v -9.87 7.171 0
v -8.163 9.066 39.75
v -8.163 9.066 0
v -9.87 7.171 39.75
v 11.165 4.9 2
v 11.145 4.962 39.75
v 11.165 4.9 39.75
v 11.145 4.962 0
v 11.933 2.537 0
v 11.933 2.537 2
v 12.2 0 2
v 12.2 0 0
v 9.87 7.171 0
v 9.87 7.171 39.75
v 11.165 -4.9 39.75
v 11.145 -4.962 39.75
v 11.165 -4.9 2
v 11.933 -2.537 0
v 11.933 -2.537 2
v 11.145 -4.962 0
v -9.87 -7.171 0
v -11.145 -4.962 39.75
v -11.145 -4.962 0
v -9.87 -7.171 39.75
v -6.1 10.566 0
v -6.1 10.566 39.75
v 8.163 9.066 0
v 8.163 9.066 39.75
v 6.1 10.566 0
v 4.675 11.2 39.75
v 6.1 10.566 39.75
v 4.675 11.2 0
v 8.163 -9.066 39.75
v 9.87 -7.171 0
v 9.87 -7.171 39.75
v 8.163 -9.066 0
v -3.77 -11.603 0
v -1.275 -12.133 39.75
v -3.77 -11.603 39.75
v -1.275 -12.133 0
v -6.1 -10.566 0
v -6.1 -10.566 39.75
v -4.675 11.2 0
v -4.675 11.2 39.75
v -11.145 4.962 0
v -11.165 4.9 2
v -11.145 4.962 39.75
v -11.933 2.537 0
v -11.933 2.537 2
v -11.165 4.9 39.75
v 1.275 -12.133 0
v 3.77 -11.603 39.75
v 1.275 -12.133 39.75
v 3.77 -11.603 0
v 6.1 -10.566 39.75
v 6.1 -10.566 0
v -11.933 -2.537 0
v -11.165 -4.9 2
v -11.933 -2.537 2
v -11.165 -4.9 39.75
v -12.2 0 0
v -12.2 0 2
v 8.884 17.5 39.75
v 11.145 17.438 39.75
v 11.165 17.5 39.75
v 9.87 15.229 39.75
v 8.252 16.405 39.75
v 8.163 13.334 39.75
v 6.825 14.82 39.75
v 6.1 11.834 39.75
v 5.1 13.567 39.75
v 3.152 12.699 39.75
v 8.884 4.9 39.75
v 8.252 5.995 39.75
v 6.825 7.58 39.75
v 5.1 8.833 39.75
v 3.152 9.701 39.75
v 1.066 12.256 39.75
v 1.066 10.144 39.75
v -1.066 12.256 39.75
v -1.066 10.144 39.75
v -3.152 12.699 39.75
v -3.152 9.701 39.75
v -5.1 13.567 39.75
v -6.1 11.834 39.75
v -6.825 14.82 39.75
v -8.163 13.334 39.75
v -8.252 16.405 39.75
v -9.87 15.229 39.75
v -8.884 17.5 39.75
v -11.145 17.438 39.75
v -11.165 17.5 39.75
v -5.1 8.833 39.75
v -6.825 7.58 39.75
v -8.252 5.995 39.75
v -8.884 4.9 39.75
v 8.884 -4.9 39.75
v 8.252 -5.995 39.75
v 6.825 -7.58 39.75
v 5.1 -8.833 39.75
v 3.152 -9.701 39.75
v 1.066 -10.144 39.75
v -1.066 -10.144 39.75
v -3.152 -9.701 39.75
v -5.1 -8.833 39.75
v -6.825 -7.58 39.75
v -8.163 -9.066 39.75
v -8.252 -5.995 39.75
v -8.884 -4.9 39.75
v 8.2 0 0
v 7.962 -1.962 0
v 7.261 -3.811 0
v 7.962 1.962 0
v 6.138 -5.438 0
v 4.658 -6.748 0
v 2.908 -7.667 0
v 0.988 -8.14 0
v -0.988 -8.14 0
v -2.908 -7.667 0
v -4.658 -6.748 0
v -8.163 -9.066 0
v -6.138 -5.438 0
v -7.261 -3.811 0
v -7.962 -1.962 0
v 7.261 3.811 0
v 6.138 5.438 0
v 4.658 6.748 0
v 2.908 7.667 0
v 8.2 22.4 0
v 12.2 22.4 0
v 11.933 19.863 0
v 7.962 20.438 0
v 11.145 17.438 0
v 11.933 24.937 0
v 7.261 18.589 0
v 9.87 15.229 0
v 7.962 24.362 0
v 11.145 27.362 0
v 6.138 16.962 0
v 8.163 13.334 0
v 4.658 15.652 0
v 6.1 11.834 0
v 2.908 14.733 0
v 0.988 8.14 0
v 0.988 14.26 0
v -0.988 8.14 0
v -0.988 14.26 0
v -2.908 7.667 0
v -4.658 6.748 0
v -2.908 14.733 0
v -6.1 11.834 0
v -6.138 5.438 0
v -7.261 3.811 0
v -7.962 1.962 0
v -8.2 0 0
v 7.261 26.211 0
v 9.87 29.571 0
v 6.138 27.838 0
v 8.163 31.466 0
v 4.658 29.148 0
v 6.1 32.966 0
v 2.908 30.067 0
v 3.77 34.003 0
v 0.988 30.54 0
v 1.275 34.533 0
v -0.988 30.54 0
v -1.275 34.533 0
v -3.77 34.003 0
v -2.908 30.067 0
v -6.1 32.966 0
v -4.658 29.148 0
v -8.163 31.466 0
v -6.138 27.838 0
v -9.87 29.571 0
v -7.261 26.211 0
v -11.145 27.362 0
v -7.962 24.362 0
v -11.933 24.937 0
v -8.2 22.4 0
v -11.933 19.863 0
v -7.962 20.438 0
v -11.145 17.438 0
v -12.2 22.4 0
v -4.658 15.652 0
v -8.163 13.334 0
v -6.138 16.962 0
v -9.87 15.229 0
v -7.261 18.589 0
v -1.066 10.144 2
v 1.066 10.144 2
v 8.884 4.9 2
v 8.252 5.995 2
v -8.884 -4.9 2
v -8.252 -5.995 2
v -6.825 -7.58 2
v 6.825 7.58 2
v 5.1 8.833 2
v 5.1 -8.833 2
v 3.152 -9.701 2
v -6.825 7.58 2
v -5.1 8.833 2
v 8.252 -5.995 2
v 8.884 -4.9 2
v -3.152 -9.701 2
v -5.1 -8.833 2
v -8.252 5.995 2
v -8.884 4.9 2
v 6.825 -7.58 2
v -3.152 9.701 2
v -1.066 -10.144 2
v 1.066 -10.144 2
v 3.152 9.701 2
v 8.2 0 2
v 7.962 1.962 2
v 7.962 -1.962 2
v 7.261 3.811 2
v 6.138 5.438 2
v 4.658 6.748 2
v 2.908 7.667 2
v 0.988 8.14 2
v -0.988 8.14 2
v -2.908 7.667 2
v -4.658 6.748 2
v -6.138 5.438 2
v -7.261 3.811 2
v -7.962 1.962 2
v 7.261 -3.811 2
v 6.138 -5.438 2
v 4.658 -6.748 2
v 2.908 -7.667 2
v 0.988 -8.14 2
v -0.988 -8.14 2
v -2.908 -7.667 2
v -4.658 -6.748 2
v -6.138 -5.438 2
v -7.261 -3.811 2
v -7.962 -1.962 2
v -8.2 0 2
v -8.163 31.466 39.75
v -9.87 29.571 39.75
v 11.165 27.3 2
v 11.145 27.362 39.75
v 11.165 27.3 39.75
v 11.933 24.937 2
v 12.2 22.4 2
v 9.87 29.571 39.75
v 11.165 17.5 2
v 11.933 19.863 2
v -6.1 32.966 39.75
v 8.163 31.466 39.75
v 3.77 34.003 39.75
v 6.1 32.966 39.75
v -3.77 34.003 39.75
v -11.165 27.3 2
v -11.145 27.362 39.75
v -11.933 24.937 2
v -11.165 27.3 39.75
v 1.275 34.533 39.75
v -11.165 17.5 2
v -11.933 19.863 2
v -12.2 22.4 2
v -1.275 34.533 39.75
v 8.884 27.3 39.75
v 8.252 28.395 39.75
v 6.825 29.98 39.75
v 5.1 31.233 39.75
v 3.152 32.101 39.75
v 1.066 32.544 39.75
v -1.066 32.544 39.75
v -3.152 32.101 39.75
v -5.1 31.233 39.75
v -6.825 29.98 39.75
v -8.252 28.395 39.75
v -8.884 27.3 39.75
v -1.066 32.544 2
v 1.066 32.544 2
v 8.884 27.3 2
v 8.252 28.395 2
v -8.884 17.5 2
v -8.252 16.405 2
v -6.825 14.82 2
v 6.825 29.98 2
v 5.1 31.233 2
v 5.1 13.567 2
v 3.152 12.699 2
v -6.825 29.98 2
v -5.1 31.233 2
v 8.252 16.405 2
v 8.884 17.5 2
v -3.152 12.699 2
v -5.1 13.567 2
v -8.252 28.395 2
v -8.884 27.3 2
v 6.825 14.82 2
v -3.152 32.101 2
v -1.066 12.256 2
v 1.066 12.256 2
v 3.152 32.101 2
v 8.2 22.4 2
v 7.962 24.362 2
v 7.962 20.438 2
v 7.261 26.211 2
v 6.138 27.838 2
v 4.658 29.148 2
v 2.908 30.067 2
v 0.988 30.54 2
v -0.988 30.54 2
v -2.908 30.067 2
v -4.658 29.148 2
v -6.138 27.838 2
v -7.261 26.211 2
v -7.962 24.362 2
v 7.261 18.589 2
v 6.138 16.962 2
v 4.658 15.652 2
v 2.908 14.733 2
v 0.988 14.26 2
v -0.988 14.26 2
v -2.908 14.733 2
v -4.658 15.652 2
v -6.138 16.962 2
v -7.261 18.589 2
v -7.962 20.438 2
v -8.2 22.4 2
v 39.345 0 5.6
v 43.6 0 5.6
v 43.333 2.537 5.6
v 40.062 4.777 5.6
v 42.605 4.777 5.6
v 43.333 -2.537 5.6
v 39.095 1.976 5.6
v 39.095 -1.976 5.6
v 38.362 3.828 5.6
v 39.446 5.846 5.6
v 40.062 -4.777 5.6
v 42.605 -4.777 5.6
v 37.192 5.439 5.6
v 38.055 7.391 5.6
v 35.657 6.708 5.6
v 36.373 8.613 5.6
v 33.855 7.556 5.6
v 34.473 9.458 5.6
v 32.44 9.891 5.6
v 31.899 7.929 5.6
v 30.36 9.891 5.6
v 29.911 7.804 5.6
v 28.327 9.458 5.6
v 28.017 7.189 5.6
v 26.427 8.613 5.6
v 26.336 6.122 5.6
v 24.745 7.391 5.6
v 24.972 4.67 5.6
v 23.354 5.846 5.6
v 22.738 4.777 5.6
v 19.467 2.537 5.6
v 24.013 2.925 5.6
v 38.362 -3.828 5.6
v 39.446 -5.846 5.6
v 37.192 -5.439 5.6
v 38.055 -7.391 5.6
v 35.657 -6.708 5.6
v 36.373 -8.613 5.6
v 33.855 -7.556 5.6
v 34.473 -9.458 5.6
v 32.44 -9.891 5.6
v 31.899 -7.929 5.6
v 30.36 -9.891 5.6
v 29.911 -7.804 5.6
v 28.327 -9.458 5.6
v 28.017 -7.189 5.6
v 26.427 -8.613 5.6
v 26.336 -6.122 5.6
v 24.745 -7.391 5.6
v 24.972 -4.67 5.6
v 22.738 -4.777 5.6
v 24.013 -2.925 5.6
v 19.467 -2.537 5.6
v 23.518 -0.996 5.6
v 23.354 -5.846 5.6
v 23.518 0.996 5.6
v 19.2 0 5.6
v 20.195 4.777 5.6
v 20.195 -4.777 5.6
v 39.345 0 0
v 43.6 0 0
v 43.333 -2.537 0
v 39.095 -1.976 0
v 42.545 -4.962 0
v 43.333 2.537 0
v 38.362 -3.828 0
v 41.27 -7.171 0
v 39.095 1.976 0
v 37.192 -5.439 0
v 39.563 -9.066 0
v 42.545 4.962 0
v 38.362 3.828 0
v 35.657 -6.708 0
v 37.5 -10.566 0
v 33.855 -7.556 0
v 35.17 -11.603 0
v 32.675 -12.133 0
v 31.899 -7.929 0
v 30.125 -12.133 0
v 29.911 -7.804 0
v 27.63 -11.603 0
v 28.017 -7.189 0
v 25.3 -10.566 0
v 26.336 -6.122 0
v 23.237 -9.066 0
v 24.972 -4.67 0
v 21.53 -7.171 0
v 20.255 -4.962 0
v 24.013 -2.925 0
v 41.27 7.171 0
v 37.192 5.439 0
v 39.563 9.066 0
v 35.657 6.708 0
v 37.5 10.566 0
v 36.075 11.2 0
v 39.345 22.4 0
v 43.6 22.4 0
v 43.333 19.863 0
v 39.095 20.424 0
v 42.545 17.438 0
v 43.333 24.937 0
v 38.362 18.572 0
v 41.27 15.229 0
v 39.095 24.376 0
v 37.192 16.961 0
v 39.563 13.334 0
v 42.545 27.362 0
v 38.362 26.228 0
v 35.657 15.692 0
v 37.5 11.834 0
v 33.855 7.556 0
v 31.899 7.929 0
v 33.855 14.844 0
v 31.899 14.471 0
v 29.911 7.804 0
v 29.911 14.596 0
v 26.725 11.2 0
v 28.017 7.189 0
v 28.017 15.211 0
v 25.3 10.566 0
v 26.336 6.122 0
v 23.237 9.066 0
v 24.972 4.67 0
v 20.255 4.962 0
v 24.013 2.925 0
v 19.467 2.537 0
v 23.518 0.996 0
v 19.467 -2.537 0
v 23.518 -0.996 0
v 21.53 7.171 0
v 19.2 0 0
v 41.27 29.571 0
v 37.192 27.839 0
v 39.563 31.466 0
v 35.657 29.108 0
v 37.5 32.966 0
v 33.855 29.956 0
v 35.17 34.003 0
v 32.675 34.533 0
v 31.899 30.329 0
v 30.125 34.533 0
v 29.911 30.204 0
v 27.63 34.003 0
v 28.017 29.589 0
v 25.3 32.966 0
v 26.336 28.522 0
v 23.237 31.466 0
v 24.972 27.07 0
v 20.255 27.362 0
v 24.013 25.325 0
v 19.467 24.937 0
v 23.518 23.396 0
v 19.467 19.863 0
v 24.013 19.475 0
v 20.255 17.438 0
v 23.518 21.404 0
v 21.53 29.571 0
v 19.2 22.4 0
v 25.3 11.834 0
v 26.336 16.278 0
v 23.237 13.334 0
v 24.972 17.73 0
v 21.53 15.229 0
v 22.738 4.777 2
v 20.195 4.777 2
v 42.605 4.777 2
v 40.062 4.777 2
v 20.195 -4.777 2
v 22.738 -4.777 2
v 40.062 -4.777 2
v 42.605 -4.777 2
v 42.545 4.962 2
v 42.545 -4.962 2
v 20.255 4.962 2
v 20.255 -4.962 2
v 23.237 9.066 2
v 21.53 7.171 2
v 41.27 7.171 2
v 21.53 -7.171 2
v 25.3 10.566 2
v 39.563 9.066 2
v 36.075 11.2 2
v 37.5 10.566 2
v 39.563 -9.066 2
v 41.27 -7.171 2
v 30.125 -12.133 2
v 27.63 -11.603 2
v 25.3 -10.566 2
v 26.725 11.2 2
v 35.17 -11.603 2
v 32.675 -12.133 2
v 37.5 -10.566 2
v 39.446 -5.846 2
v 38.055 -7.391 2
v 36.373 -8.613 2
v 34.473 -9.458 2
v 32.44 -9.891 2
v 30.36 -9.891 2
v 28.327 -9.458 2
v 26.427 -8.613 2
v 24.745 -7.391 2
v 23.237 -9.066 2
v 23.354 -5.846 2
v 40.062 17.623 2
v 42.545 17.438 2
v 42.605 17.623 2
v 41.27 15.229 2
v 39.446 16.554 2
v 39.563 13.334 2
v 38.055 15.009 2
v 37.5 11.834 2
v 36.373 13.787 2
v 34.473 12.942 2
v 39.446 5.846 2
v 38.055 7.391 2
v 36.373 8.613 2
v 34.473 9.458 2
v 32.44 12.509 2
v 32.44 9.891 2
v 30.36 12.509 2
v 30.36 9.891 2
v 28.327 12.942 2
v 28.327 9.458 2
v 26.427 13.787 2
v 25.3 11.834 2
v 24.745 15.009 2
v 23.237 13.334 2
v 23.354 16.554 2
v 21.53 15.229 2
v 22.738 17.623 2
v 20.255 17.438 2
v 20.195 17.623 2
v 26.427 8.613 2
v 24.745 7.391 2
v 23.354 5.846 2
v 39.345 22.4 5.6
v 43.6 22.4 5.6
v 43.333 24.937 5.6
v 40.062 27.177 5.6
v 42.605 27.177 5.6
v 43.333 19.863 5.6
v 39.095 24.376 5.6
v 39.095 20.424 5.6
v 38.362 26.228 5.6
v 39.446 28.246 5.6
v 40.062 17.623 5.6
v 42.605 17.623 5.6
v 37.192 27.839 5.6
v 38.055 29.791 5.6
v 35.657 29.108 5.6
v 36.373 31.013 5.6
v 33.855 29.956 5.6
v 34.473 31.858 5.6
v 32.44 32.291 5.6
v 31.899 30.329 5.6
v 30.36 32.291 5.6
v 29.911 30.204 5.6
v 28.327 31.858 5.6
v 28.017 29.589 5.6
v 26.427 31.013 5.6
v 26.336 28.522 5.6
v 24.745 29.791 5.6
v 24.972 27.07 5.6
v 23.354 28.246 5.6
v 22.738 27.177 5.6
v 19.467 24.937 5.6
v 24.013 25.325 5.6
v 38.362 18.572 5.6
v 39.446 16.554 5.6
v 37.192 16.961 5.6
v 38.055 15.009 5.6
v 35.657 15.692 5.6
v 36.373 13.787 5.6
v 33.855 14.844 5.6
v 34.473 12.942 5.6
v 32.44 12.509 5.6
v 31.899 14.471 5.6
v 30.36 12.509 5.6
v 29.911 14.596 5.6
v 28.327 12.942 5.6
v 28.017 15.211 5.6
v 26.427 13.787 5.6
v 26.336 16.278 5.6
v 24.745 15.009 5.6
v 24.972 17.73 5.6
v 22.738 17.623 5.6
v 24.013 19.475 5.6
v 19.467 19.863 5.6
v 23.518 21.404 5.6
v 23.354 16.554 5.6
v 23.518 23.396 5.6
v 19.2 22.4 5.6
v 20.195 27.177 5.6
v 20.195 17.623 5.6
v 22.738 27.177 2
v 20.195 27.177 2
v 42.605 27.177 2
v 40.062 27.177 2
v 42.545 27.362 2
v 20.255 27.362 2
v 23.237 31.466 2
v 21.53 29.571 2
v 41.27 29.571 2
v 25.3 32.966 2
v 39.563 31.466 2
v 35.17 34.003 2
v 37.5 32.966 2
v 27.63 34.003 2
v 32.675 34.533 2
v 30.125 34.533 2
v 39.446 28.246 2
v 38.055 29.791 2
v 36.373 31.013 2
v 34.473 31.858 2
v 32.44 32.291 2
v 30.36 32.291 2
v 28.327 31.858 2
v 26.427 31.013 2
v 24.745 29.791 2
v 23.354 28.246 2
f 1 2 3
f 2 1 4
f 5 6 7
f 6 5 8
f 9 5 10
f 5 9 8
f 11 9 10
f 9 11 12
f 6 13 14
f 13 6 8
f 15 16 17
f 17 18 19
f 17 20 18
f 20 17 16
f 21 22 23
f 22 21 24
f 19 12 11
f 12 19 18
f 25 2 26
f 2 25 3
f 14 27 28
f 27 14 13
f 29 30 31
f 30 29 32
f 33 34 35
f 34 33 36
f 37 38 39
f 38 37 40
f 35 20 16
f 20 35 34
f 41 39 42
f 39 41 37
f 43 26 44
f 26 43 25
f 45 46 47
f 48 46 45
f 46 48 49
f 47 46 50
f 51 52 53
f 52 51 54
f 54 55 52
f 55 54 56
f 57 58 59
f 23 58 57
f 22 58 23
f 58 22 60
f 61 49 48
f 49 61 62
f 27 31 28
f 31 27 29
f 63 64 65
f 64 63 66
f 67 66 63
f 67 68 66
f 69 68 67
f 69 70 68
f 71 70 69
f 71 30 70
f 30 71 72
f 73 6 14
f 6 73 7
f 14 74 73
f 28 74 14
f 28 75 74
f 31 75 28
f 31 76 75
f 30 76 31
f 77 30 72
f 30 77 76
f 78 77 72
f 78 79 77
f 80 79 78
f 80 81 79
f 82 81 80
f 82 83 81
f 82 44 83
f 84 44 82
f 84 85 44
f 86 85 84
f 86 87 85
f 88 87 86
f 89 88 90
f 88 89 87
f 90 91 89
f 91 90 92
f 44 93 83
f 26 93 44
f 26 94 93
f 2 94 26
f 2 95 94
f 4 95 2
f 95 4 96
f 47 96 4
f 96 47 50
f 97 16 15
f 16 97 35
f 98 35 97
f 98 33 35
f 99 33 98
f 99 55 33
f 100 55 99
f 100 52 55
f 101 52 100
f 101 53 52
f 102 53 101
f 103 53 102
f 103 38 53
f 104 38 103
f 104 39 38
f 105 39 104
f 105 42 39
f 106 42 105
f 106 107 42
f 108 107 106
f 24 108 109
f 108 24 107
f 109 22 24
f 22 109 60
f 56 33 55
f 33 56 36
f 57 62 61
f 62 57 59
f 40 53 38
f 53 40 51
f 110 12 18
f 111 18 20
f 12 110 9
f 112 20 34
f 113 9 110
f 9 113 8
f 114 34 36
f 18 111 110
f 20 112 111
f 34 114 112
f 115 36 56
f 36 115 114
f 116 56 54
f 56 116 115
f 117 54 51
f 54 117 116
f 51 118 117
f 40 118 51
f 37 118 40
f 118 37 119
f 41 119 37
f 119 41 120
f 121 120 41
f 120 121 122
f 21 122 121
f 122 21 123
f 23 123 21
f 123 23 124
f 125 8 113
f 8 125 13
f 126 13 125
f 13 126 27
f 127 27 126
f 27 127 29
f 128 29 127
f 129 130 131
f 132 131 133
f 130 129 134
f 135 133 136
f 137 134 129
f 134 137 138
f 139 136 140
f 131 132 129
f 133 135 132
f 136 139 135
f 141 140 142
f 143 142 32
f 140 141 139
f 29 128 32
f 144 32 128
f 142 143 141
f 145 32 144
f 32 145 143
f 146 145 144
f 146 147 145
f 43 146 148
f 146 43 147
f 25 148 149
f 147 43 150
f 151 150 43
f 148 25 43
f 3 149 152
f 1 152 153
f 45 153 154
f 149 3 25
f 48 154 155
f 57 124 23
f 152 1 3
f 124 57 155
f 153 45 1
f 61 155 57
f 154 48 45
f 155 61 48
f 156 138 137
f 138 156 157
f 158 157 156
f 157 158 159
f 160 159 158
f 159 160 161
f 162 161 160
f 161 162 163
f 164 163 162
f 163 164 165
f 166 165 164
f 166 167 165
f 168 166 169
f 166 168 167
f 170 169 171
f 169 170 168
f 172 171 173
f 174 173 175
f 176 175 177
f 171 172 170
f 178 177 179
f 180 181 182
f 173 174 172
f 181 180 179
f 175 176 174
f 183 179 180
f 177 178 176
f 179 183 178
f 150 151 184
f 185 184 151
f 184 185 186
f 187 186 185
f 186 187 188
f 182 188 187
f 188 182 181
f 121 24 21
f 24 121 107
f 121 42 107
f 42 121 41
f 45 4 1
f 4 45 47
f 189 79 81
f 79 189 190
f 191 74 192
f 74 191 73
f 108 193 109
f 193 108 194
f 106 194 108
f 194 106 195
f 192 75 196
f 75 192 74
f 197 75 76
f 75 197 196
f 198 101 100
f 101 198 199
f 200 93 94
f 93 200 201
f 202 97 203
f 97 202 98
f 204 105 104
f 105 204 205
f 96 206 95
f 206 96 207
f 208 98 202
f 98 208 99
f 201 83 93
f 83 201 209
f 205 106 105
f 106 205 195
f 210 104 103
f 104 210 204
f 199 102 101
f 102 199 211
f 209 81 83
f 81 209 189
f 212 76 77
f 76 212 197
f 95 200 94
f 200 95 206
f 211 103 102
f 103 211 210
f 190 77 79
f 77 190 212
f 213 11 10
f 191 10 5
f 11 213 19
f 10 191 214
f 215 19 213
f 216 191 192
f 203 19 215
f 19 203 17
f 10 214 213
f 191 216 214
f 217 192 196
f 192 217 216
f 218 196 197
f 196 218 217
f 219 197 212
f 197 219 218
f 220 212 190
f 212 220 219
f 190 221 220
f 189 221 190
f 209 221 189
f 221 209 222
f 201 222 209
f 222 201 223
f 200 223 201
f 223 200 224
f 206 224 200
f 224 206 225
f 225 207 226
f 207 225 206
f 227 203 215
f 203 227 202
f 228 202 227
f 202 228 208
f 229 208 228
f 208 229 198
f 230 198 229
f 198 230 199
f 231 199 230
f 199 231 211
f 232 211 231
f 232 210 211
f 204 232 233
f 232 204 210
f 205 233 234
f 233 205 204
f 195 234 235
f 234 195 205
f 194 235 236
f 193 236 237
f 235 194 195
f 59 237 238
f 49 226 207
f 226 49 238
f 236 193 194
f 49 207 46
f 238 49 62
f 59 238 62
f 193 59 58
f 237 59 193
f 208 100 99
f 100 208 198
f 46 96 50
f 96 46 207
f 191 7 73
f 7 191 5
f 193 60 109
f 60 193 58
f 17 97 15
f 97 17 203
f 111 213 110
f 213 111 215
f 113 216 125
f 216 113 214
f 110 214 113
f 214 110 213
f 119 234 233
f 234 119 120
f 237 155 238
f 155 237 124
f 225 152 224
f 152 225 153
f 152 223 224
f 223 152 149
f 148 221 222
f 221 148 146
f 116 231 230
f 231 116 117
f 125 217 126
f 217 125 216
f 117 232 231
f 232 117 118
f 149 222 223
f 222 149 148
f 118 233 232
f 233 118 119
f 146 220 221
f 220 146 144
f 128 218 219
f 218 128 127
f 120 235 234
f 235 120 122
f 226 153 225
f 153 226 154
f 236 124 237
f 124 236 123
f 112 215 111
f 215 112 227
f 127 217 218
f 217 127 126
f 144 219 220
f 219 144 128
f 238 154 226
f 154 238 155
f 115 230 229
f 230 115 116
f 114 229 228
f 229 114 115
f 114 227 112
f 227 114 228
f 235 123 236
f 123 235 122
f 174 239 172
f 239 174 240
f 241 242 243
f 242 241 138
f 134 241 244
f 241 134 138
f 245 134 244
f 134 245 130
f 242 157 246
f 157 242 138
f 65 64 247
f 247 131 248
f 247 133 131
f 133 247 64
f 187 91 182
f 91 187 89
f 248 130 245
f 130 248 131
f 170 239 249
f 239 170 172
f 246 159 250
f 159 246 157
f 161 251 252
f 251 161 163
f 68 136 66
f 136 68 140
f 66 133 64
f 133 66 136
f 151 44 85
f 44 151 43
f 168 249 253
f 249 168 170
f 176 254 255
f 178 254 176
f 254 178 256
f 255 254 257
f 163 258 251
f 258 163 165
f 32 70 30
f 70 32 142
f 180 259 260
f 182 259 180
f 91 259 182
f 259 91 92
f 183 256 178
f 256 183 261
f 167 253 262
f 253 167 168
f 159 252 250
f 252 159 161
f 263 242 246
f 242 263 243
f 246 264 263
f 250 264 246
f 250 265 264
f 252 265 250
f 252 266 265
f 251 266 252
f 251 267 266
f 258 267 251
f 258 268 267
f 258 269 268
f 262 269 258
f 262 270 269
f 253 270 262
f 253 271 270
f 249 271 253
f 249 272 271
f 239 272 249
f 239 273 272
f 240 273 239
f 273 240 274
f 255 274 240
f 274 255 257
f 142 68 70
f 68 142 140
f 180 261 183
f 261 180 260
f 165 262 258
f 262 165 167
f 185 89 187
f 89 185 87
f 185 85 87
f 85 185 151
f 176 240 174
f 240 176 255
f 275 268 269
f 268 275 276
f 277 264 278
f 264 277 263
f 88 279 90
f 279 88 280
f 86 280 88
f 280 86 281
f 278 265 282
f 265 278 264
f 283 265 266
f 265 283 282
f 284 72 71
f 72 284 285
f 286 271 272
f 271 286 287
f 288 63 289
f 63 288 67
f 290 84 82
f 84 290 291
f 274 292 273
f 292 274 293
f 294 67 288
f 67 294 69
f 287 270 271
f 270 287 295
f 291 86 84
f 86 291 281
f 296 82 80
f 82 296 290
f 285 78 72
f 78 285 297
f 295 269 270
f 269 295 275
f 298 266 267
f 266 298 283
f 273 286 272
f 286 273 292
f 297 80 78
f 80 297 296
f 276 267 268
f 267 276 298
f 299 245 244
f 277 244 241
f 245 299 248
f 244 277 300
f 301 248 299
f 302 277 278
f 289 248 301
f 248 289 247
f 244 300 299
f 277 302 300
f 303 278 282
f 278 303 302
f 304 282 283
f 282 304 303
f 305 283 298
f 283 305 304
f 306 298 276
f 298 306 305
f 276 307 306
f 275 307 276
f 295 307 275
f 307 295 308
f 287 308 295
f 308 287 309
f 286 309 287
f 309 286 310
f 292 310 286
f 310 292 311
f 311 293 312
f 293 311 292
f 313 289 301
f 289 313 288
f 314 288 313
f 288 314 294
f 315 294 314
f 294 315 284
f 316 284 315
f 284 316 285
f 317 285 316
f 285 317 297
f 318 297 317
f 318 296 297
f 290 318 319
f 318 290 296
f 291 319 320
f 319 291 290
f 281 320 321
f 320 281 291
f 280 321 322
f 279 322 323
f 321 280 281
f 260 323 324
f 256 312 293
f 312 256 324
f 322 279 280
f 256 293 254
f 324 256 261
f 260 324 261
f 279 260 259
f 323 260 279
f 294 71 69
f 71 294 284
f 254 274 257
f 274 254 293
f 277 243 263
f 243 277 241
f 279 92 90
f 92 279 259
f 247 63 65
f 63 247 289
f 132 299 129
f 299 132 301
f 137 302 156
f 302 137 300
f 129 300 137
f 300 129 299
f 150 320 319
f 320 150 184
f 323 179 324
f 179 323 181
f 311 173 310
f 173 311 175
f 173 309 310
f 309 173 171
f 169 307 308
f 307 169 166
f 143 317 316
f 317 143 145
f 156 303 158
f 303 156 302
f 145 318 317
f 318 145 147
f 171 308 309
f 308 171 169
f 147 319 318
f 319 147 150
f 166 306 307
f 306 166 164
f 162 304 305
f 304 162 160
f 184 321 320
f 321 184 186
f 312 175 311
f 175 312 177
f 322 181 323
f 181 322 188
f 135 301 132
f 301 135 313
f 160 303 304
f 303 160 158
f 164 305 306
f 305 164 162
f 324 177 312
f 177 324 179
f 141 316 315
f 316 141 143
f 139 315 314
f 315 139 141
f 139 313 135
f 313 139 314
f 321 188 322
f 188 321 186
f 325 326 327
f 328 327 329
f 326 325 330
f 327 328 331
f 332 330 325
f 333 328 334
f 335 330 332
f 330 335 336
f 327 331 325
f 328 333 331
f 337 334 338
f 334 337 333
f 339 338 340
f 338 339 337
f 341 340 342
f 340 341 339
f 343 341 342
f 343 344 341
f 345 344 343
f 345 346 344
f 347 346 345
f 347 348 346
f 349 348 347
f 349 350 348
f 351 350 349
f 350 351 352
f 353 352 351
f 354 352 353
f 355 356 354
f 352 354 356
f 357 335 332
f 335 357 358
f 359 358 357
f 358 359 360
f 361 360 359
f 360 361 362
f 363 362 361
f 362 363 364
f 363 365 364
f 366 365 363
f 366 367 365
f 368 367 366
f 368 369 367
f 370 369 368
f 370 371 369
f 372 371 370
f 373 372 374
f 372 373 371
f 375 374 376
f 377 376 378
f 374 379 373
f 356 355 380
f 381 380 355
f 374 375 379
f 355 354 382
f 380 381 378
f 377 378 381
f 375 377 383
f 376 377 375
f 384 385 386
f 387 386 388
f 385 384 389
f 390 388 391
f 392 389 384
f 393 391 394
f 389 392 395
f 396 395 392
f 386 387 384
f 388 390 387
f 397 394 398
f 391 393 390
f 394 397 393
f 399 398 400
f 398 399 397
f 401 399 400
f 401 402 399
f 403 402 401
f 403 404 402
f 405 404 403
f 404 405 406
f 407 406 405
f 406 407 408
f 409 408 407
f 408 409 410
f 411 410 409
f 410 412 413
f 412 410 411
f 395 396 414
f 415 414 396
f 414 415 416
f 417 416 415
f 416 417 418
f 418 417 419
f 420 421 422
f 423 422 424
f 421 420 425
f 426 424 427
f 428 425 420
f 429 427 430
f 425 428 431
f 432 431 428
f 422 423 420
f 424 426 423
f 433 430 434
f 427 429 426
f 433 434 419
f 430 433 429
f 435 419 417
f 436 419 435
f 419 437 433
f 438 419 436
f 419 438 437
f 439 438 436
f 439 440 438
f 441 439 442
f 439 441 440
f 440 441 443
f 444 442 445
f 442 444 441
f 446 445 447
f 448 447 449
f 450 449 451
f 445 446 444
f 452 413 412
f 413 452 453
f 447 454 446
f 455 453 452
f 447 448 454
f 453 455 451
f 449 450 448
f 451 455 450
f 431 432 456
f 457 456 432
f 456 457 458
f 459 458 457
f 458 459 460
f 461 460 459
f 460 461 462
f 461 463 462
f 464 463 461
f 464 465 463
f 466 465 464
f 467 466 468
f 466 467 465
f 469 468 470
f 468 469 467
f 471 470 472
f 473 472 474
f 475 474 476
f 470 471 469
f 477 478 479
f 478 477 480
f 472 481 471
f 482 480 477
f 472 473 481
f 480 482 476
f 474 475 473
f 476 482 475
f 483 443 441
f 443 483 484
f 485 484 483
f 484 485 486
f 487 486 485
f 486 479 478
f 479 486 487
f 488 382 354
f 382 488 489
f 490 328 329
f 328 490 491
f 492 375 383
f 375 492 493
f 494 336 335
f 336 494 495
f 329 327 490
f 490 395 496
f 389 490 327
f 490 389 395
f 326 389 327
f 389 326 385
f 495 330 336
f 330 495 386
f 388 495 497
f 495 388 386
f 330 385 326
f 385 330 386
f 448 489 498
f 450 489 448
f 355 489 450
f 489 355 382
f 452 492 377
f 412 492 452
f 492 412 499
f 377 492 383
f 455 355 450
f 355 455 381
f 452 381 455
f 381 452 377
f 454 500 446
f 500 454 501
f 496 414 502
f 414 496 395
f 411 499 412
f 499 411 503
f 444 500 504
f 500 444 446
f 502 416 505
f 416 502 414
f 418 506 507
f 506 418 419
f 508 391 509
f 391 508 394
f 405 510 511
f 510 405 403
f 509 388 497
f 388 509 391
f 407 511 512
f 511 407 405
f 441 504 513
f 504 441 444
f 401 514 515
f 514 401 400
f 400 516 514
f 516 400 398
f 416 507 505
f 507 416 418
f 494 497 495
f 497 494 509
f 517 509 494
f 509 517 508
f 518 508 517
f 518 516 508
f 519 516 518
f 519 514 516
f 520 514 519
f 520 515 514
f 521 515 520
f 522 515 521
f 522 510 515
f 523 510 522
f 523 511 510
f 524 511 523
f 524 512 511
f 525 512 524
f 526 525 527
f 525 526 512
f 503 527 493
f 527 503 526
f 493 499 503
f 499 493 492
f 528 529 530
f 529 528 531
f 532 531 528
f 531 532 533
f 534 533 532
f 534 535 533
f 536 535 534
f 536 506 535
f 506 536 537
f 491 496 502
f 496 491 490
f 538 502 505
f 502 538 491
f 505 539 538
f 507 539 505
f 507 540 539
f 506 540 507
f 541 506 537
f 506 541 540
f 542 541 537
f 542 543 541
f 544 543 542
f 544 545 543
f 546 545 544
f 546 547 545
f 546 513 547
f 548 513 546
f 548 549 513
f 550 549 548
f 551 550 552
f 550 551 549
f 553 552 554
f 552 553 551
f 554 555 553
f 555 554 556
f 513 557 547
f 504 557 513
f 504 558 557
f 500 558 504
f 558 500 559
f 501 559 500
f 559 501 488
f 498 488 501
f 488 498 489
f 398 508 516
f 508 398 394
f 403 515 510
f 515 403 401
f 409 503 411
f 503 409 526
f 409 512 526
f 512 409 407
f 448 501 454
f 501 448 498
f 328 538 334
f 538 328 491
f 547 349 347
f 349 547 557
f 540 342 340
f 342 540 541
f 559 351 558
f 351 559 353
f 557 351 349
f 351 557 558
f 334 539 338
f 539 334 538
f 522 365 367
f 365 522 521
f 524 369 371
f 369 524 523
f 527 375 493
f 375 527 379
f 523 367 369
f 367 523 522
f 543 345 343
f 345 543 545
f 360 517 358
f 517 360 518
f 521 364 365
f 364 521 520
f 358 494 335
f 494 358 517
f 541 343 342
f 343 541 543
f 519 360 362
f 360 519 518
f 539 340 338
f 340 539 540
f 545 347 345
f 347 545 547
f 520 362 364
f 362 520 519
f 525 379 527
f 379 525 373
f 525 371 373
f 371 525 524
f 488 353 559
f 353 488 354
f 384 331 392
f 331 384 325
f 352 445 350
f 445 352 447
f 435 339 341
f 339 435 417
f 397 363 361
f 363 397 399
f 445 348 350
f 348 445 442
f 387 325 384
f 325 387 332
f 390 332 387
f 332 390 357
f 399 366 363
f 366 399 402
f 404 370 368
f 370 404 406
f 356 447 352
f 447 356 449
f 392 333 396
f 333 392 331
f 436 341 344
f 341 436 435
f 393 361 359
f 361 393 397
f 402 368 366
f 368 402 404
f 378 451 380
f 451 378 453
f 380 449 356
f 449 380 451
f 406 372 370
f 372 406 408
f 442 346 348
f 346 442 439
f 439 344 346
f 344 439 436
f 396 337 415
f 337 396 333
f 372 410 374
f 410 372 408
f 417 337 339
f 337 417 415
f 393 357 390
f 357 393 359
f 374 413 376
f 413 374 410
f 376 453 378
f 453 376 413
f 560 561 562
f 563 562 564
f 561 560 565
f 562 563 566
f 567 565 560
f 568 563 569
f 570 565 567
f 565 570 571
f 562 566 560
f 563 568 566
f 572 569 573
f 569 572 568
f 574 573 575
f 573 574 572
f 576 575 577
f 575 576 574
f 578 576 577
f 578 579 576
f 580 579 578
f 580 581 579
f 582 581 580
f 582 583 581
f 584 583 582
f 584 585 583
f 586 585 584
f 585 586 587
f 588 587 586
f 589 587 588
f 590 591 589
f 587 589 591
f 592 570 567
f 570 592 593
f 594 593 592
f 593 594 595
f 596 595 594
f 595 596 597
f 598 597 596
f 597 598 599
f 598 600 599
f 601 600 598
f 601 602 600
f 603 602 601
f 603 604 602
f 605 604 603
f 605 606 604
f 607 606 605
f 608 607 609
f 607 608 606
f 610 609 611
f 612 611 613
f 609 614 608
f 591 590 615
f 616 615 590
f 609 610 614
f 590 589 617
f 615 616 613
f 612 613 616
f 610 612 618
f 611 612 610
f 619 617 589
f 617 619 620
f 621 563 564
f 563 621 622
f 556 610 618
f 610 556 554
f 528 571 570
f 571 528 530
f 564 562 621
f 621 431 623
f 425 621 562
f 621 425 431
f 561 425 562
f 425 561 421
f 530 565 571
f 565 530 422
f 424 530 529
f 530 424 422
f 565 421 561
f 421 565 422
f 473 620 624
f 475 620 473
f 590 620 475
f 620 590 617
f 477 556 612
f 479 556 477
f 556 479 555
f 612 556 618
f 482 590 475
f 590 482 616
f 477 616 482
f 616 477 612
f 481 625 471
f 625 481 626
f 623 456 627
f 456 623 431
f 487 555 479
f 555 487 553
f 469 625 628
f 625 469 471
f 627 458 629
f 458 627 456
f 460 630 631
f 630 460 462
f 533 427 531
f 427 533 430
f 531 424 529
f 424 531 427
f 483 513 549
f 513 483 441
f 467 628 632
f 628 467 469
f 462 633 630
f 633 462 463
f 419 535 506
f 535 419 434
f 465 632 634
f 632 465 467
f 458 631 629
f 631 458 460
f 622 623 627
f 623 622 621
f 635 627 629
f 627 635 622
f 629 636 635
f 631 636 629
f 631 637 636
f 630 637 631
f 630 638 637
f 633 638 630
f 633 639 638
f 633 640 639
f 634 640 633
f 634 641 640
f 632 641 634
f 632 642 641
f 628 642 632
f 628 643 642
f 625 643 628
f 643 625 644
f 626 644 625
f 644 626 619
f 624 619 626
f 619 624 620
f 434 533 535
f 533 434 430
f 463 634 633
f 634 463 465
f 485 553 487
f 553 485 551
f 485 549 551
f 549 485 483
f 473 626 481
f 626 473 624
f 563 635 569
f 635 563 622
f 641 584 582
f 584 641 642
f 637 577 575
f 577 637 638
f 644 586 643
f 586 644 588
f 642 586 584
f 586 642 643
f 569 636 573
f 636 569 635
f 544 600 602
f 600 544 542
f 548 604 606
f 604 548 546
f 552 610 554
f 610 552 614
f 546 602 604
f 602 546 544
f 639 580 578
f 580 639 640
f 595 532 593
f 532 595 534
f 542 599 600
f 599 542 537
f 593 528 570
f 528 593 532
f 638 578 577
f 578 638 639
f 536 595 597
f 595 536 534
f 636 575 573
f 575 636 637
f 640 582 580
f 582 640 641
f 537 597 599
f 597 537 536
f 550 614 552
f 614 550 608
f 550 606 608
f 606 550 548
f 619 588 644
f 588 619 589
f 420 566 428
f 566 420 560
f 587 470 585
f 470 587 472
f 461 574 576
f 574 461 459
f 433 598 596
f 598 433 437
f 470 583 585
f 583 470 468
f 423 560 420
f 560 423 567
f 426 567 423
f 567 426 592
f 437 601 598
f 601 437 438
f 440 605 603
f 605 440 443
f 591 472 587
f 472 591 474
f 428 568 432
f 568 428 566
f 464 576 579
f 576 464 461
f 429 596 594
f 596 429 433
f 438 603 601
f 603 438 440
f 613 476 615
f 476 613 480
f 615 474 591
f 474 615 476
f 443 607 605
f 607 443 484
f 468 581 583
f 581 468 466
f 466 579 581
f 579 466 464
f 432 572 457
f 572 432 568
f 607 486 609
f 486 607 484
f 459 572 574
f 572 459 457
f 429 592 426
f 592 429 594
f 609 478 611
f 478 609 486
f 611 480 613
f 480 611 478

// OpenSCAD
/*
 * PARAMETRIC COIN TUBES + CAP
 * VERSION 1.3.1
 * last update: 02/12/13
 * design by newq 
 * mod kitwallace (thanks!)
 */

// 
// the generated tubes insides are 2 coins higher than the number of coins they fit

coin_type = 0; // [ 0:10 KZT, 1:20 KZT, 2:50 KZT,  3:100 KZT, 4:5 KZT, 5:1 KZT, 6:2 Euro cent, 7: 1 Euro cent, 8: 1 US Dollar, 9: 0.50 US Dollar, 10: 0.25 US Dollar, 11: 0.10 US Dollar, 12: 0.05 US Dollar, 13: 0.01 US Dollar, 14: 2 Canadian Dollar, 15: 1 Canadian Dollar, 16: 0.50 Canadian Dollar, 17: 0.25 Canadian Dollar, 18: 0.10 Canadian Dollar, 19: 0.05 Canadian Dollar, 20: 0.01 Canadian Dollar]

// how many stacked coins should fit in a tube
number_of_coins = 25; 
number_of_tubes = 2; 

// Do you want to print the tubes?
generate_tube = 1; // [1:Yes, 0:No] 
// Do you want a cap to close the tube?
generate_cap = 1; // [1:Yes, 0:No] 
// thickness of wall and bottom (mm)
tube_wall = 2;  
// clearance from coin to wall of tube (mm) 
clearance = 0.4;
// if the cap fits too tight you might decrease slightly
fudge_factor = 0.975; 

// NOTHING TO SEE HERE :)

// coin data - name, diameter, height
coins = [ 
              ["10 KZT", 19.6, 1.35], 
              ["20 KZT", 18.3, 1.5],
              ["50 KZT", 23, 1.6],
              ["100 KZT", 24.5, 1.8],
              ["5 KZT", 17.3, 1.35],
              ["1 KZT", 15, 1.3],
              ["2 Euro cents", 18.75, 1.67],
              ["1 Euro cents", 16.25, 1.67],
              ["1 US Dollar", 26.50, 2.00],
              ["0.50 US Dollar", 30.61, 2.15],
              ["0.25 US Dollar", 24.26, 1.75],
              ["0.10 US Dollar", 17.91, 1.35],
              ["0.05 US Dollar", 21.21, 1.95],
              ["0.01 US Dollar", 19.05, 1.55],
              ["2 Canadian Dollar", 28.00, 1.80],
              ["1 Canadian Dollar", 26.50, 1.75],
              ["0.50 Canadian Dollar", 27.13, 1.95],
              ["0.25 Canadian Dollar", 23.88, 1.58],
              ["0.10 Canadian Dollar", 18.03, 1.22],
              ["0.05 Canadian Dollar", 21.2, 1.76],
              ["0.01 Canadian Dollar", 19.05, 1.45]
            ];

coin_diameter = coins[coin_type][1];
coin_height = coins[coin_type][2];

// generating the tubes
if (generate_tube) {
  assign(cyl_inner_h = (coin_height * number_of_coins) + (4 * tube_wall),
             cyl_inner_r = (coin_diameter / 2) + clearance,

             cyl_outer_h = (coin_height * number_of_coins) + (3 * tube_wall),
             cyl_outer_r = (coin_diameter / 2) + tube_wall + clearance,

             cutout_x = coin_diameter + (4 * tube_wall),
             cutout_y = (coin_diameter / 2),
             cutout_z = (coin_height * number_of_coins) + (3 * tube_wall)
             )


  for (z = [0 : (number_of_tubes-1)]){

	translate (v = [0, z * (cyl_outer_r * 2 - tube_wall), 0]){
		difference(){	
			difference(){
				difference() {
					// outer tube
					cylinder(h = cyl_outer_h, r = cyl_outer_r);
					// inner tube
					translate(v = [0, 0, tube_wall]) {
						cylinder(h = cyl_inner_h, r = cyl_inner_r);
					}
				}
				// round bottom cutout
				translate (v = [0, 0, ((cutout_z / 2) + tube_wall)]){
					cube(size = [cutout_x, cutout_y, cutout_z], center = true);
				}
			}
			// cutout
			translate (v = [0, 0, -tube_wall]){
				cylinder(h = (cyl_inner_h + tube_wall), r = (cyl_inner_r - tube_wall));
			}
		}
   }
}

}

// generating the tube tops

if (generate_cap) {
   assign (cyl_inner_h = 3*tube_wall - clearance,
               cyl_inner_r = ((coin_diameter / 2) + clearance) * fudge_factor,

               cyl_outer_h = tube_wall,
               cyl_outer_r = (coin_diameter / 2) + tube_wall + clearance,

               cutout_x = coin_diameter + (4 * tube_wall),
               cutout_y = (coin_diameter / 2) * fudge_factor,
               cutout_z = 3*tube_wall - clearance
             )
    translate([1.5 * coin_diameter + tube_wall, 0, 0]){
	for (z = [0 : (number_of_tubes-1)]){
		
		translate (v = [0, z * (cyl_outer_r * 2 - tube_wall), 0]){
			difference(){
				union(){		
					cylinder(h = cyl_outer_h, r = cyl_outer_r);
					cylinder(h = cyl_inner_h, r = cyl_inner_r);
				
					intersection(){
						translate([0,0,cutout_z/2]){
							cube(size = [cutout_x, cutout_y, cutout_z], center = true);
						}
						cylinder(h = cyl_outer_h+10, r = cyl_outer_r);
					}
				}
				
				translate([0,0,-(cyl_inner_h /2)]){
					cylinder(h = cyl_inner_h *2, r = cyl_inner_r - tube_wall);
				}			
			}		
		}
	}	
}
}
